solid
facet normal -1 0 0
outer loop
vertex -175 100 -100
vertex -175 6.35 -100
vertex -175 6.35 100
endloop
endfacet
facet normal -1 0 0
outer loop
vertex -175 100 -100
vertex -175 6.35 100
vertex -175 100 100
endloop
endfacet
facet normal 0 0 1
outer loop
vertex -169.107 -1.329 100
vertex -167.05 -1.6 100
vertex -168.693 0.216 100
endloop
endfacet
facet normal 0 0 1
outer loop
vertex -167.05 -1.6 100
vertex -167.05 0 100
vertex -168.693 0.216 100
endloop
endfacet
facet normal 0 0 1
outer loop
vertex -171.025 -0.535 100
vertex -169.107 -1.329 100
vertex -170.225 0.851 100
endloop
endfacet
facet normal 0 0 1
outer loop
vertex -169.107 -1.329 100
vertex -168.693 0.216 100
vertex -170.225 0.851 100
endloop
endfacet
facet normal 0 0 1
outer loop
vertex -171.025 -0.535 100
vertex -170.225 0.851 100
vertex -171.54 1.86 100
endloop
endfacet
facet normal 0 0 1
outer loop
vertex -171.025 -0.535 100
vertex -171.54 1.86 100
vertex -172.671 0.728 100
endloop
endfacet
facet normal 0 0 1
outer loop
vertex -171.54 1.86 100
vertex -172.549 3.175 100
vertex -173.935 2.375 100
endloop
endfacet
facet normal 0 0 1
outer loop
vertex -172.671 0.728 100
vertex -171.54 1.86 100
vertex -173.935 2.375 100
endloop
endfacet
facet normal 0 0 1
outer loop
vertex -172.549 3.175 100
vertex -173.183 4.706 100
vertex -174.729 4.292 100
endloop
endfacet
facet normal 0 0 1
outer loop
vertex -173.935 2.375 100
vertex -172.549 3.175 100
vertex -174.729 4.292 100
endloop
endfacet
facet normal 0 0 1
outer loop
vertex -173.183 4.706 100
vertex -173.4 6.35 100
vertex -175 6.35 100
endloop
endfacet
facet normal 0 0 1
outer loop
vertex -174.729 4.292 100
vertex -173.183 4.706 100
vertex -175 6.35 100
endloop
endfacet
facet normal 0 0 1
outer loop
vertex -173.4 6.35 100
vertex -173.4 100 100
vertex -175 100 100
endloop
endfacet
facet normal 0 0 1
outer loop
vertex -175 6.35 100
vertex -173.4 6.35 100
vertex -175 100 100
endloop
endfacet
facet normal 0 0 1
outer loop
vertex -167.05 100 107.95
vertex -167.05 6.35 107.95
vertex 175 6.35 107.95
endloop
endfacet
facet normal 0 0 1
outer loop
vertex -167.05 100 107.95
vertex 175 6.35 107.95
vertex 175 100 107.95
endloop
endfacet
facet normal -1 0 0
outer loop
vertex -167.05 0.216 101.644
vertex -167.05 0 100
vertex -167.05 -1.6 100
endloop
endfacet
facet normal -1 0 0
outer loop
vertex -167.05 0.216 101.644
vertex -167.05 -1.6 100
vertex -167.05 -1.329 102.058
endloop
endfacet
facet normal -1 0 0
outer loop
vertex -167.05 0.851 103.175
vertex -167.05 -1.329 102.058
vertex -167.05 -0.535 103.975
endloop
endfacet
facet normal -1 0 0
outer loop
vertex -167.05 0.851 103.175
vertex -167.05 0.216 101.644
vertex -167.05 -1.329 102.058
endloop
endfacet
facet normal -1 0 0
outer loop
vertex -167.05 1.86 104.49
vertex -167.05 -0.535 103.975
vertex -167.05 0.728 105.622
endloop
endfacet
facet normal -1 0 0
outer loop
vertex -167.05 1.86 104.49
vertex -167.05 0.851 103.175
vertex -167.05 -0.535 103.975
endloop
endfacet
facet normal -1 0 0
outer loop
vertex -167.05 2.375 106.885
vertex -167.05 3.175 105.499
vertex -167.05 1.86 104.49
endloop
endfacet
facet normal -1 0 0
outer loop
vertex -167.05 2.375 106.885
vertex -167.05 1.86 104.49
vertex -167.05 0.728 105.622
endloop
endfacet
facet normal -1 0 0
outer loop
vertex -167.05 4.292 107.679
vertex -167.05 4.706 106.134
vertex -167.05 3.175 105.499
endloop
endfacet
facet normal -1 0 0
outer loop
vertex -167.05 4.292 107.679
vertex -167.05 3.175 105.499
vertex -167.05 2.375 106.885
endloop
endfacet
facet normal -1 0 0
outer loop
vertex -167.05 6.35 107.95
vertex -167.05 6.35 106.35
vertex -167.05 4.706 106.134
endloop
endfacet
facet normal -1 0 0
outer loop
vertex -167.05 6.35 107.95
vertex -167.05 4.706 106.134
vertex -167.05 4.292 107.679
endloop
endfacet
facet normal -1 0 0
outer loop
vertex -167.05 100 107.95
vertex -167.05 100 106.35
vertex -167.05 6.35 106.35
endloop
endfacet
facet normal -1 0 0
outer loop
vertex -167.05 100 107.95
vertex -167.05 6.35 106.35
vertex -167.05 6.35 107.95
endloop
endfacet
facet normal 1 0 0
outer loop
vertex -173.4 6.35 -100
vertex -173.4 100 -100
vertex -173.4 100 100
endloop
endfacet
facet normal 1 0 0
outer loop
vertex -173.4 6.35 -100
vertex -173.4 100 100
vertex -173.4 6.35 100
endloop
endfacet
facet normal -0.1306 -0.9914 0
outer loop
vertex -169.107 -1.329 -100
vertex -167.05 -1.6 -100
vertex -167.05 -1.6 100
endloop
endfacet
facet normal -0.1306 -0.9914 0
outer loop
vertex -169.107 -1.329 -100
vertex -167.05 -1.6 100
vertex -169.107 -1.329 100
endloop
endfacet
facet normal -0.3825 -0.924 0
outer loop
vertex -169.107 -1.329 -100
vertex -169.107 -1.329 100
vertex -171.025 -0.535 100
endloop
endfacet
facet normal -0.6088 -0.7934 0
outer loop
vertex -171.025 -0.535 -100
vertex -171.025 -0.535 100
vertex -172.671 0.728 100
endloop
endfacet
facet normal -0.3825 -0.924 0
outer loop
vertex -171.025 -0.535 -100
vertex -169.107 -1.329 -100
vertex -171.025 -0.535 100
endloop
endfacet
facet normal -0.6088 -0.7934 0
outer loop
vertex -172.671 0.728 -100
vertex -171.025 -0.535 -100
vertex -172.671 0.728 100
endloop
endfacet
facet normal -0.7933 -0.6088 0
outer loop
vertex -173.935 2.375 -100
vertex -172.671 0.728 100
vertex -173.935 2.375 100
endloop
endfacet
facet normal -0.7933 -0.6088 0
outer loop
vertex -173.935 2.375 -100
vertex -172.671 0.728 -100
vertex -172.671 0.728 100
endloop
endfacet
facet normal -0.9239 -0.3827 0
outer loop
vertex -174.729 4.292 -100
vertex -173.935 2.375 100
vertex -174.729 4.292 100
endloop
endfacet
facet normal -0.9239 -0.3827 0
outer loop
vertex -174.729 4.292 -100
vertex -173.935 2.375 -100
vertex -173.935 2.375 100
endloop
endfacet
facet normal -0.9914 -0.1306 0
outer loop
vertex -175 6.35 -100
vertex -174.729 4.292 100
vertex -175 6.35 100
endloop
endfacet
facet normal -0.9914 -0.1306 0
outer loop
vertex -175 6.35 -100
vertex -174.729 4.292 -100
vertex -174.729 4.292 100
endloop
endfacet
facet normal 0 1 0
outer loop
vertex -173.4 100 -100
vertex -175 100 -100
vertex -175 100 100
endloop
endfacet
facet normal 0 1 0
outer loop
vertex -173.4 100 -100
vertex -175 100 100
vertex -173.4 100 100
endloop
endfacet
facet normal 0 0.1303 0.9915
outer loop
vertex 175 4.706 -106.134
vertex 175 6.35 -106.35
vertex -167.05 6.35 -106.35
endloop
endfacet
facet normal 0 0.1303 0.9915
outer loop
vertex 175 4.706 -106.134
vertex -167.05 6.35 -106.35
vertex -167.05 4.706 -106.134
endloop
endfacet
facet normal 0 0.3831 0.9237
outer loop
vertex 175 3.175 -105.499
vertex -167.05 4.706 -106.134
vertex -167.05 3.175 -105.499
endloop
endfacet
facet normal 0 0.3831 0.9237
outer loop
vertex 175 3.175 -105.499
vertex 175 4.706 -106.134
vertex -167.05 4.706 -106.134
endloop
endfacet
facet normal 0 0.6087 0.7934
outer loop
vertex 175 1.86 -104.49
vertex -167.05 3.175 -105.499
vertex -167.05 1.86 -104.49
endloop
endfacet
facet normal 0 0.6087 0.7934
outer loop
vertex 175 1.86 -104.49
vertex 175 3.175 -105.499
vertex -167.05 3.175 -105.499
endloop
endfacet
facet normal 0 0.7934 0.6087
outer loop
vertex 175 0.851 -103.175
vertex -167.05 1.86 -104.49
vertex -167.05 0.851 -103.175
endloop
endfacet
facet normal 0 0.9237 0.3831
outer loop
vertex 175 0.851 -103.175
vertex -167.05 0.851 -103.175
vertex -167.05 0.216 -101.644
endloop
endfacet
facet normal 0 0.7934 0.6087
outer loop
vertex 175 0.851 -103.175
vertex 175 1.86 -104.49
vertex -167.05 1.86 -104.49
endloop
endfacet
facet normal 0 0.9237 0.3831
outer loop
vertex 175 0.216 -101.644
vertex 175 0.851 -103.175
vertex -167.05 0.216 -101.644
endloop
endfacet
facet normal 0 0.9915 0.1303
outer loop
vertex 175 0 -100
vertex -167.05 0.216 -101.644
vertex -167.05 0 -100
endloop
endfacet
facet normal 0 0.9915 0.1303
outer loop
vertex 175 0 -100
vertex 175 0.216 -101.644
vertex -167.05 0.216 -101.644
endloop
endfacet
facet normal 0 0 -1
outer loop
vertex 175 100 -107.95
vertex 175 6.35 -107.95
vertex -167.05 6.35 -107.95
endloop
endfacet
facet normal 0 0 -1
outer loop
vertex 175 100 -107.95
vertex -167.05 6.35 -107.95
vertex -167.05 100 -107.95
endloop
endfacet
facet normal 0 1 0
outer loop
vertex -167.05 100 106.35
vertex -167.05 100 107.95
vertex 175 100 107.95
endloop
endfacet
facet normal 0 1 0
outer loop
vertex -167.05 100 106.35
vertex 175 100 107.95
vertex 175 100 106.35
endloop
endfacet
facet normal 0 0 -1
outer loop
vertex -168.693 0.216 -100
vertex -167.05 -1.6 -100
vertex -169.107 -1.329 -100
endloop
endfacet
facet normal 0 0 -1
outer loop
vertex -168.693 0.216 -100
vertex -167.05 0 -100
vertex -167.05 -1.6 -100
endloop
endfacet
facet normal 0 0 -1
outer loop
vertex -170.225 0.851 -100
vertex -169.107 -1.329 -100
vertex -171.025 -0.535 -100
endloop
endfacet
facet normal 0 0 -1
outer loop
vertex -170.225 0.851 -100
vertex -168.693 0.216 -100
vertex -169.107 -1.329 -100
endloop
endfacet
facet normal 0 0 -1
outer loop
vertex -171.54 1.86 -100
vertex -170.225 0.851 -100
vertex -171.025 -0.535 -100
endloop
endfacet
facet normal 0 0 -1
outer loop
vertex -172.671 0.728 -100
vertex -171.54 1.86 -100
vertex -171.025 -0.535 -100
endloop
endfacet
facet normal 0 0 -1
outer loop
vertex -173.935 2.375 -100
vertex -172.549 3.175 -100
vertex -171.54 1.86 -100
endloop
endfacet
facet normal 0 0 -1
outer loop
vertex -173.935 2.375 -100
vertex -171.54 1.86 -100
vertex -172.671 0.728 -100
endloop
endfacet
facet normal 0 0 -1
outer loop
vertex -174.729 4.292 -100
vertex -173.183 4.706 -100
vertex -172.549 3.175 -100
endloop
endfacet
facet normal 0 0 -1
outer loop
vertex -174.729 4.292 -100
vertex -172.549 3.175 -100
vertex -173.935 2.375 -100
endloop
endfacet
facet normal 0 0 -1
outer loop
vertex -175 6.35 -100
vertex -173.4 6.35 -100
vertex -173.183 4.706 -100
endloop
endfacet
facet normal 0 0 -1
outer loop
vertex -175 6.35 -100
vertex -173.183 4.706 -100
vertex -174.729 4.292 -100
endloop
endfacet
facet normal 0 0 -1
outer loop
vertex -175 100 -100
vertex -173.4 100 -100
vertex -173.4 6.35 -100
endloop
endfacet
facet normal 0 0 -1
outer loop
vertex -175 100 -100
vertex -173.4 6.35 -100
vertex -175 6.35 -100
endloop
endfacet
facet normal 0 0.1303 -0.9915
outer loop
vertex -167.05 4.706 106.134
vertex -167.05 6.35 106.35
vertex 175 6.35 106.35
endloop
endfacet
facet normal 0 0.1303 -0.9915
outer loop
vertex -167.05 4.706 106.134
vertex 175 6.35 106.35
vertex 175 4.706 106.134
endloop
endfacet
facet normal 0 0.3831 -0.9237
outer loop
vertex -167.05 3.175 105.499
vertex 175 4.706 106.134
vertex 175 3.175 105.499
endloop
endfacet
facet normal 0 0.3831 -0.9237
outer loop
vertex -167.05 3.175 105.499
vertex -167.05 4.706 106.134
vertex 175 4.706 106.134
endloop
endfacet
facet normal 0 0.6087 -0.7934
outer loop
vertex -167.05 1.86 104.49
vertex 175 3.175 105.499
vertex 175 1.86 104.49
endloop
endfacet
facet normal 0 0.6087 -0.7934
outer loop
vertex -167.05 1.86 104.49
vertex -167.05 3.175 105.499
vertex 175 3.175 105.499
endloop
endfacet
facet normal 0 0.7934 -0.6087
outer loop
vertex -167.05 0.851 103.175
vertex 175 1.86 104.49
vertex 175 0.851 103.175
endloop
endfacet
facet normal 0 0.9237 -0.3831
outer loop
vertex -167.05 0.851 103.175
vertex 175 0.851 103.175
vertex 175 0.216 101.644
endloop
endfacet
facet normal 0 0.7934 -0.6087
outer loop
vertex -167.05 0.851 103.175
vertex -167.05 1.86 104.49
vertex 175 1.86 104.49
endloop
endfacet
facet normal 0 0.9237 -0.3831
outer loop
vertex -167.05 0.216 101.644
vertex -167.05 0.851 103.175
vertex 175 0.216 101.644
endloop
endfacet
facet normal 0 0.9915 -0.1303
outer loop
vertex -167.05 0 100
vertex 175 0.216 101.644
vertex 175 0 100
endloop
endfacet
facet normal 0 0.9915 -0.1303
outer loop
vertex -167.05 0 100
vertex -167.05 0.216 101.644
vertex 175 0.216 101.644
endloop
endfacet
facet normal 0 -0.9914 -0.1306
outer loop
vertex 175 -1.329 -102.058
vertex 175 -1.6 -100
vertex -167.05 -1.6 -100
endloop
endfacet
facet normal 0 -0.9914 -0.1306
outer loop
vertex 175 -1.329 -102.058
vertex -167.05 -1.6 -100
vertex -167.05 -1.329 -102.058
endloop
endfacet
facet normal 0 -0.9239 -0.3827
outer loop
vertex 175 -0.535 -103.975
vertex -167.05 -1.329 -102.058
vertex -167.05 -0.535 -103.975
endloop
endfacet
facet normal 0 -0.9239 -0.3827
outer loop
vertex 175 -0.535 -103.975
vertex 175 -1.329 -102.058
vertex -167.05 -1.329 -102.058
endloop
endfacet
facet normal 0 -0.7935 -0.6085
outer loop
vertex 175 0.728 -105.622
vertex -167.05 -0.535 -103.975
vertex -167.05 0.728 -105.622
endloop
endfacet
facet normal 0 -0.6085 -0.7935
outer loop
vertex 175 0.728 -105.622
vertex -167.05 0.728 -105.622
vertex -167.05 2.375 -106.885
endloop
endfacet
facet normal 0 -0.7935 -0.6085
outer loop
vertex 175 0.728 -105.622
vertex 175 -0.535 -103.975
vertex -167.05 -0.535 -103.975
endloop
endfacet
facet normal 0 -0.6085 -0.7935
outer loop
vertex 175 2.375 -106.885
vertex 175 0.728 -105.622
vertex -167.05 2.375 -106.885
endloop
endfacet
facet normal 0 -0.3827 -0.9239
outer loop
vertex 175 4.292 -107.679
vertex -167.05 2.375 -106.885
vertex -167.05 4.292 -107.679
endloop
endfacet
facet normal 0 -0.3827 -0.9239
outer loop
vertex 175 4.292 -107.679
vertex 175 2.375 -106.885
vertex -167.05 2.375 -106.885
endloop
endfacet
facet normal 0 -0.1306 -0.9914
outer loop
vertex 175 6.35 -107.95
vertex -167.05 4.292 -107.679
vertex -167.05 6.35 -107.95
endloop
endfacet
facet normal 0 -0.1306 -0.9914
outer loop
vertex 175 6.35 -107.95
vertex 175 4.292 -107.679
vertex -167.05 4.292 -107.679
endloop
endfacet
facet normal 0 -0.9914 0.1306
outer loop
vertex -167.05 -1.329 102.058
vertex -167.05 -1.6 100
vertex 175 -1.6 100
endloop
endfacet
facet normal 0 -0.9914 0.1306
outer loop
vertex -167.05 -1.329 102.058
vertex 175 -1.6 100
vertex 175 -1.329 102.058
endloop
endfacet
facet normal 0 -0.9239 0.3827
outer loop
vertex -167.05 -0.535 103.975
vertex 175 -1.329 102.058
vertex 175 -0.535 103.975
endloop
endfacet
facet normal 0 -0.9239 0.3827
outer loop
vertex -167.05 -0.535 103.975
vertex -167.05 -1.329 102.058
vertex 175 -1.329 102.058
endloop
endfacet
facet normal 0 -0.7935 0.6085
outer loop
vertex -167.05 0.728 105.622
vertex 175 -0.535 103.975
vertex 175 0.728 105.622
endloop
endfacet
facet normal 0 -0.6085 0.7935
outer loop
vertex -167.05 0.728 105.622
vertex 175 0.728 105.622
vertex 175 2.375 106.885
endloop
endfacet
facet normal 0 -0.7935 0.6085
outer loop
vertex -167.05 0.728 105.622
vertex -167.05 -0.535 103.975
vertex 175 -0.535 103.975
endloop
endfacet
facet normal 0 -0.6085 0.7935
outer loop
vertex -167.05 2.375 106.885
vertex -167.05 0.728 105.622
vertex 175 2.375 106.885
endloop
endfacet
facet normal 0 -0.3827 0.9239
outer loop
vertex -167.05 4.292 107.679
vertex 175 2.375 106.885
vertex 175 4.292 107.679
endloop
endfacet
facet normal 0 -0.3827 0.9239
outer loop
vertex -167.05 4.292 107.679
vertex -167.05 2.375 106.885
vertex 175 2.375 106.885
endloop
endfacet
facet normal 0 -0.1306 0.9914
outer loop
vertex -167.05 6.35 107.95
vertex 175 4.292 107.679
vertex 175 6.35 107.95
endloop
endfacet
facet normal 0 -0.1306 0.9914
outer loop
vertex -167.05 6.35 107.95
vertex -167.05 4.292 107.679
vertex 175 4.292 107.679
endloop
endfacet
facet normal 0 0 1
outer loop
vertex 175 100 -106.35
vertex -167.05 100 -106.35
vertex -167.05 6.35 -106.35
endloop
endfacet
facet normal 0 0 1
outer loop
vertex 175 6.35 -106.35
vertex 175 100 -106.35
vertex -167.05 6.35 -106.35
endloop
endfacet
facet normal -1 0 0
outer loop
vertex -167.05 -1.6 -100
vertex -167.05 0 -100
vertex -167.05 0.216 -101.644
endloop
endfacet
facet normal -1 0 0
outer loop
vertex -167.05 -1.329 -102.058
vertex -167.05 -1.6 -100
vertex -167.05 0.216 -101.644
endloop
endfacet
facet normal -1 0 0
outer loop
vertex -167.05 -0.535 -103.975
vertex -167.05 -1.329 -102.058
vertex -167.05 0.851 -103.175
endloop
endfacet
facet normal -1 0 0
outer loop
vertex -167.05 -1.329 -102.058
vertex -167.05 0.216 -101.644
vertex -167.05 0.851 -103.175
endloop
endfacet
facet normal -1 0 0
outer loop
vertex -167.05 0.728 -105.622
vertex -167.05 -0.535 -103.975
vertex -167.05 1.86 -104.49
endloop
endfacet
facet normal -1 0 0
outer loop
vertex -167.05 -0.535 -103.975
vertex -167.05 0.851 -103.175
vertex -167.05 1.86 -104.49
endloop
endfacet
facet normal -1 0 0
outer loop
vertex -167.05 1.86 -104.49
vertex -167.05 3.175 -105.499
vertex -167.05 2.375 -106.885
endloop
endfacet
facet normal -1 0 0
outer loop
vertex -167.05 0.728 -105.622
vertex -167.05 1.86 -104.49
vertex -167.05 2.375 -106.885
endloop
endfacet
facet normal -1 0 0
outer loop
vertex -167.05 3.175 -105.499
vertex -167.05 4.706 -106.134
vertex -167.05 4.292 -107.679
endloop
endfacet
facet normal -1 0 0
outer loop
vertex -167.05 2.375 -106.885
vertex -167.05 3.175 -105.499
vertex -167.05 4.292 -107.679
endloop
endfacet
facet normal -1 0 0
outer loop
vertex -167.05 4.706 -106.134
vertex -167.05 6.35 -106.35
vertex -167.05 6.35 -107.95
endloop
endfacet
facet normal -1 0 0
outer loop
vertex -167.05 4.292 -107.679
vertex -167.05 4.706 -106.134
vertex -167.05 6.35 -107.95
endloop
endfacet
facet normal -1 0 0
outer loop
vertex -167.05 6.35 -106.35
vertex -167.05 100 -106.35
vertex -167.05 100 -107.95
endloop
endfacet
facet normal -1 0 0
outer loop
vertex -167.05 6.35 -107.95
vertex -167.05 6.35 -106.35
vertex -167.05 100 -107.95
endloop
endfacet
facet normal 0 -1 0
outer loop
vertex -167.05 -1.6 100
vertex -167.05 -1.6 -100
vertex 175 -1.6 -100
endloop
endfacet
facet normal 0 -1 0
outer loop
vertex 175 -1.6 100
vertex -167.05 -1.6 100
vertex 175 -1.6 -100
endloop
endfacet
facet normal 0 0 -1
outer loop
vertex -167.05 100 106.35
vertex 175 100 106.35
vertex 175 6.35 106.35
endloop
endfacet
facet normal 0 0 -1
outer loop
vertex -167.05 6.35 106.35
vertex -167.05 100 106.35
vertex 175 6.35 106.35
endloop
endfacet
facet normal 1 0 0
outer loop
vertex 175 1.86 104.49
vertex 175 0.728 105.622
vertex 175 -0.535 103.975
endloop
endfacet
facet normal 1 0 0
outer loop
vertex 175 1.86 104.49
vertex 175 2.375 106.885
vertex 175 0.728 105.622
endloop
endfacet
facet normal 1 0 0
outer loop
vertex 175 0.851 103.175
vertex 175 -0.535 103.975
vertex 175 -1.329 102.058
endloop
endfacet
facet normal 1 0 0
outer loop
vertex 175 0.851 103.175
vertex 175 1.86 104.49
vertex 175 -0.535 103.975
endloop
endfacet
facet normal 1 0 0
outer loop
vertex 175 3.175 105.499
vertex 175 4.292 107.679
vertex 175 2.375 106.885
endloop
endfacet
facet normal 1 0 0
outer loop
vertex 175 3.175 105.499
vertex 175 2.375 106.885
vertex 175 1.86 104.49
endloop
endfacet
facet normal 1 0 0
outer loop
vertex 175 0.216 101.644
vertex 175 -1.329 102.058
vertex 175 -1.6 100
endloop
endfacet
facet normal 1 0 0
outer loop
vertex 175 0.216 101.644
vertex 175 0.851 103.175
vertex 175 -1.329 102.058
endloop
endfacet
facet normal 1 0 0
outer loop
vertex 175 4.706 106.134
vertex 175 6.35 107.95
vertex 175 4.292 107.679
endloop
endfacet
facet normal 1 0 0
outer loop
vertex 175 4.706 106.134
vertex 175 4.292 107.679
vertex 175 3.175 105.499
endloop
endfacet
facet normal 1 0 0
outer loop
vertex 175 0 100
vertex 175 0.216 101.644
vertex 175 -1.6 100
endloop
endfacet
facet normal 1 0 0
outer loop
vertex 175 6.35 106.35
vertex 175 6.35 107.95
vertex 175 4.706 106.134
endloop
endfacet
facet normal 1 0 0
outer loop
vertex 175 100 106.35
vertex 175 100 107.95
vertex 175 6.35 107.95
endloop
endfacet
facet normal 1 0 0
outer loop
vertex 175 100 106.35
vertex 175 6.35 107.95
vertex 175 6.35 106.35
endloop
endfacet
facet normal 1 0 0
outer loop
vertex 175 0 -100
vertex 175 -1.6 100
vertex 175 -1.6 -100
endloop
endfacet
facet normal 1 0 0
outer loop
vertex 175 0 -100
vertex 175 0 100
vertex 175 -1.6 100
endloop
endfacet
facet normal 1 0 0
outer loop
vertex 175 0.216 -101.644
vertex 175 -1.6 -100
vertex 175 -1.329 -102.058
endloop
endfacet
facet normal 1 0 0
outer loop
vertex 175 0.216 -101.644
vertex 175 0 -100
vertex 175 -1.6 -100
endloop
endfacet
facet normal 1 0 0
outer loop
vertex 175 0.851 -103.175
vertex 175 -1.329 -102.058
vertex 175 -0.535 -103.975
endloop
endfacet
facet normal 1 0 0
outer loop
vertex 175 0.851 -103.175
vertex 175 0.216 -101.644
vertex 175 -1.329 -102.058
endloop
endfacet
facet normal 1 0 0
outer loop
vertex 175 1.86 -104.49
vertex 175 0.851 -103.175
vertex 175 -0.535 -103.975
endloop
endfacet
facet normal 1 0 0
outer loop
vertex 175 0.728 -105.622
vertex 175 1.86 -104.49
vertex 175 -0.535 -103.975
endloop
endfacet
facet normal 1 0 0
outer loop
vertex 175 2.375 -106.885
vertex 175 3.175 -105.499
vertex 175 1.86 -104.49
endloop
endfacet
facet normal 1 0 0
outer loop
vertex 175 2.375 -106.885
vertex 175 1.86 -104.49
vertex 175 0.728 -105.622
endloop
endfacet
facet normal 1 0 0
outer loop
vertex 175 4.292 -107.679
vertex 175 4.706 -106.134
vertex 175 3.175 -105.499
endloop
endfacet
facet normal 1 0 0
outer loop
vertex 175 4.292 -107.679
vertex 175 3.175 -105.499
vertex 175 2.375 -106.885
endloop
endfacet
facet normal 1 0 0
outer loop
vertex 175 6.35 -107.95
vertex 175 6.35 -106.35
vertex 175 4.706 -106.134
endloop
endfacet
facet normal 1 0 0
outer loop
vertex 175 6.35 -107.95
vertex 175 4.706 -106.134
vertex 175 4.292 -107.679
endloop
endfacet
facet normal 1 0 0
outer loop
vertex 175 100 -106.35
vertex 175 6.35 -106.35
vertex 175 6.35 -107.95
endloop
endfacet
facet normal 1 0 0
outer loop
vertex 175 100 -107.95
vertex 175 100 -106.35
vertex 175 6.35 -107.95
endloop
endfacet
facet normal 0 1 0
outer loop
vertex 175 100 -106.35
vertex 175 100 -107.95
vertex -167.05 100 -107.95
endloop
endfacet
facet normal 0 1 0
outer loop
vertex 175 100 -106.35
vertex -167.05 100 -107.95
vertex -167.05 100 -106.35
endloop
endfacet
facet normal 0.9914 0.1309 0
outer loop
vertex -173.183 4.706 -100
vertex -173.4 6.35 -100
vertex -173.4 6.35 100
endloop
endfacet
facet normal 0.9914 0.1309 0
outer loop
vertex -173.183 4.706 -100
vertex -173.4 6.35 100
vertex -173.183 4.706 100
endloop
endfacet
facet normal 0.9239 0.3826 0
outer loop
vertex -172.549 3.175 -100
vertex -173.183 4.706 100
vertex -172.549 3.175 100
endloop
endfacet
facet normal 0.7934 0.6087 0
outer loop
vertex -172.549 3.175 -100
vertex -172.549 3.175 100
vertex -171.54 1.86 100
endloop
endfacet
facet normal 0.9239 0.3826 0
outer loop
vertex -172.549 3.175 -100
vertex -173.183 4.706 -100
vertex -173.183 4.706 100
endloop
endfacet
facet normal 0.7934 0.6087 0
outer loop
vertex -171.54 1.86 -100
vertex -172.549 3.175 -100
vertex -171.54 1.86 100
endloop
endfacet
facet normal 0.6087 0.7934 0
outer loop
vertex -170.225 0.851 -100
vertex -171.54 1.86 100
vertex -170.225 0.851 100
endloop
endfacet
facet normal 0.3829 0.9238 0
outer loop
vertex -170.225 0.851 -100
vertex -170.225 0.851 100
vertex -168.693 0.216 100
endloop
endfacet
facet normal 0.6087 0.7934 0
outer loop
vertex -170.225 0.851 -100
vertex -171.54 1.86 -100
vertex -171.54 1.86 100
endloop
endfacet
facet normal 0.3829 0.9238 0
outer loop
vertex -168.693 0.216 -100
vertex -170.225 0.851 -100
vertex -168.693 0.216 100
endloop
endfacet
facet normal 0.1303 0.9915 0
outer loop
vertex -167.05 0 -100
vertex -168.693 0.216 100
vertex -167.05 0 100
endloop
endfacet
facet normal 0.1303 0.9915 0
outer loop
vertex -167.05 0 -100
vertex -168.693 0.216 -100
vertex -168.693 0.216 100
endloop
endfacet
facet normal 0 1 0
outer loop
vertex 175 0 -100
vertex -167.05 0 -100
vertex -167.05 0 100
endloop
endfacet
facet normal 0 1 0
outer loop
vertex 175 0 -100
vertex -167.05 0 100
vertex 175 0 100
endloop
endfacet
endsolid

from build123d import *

# Parameters (mm, degrees)
SKETCH1_W                    = 350
SKETCH1_H                    = 200
BASE_FLANGE1_DEPTH           = 1.6002
EDGE_FLANGE4_STRIP_W         = 19.1008
EDGE_FLANGE4_STRIP_H         = 1.6002
EDGE_FLANGE4_STRIP_CUT_DEPTH = 200
EDGE_FLANGE4_DEPTH           = 200
EDGE_FLANGE5_DEPTH           = 342.0498
EDGE_FLANGE5_BEND_DEPTH      = 342.0498


# Sheet-metal steps are written as plain solids
with BuildPart() as part:
    # Sketch1 → Base-Flange1 (new body)
    with BuildSketch(Plane(origin=(0, 0, 0), x_dir=(1, 0, 0), z_dir=(0, 1, 0))):
        Rectangle(SKETCH1_W, SKETCH1_H)
    extrude(amount=-BASE_FLANGE1_DEPTH)

    # Edge-Flange4 strip (across the edge) → Edge-Flange4 strip cut (cut)
    with BuildSketch(Plane(origin=(-175, 0, -100), x_dir=(1, 0, 0), z_dir=(0, 0, 1))):
        with Locations((-1.6002, -0.8001)):
            Rectangle(EDGE_FLANGE4_STRIP_W, EDGE_FLANGE4_STRIP_H)
    extrude(amount=EDGE_FLANGE4_STRIP_CUT_DEPTH, mode=Mode.SUBTRACT)

    # Edge-Flange4 section (across the edge) → Edge-Flange4 (add)
    with BuildSketch(Plane(origin=(-175, 0, -100), x_dir=(1, 0, 0), z_dir=(0, 0, 1))):
        with BuildLine():
            Line((0, 6.35), (0, 100))
            Line((0, 100), (1.6002, 100))
            Line((1.6002, 100), (1.6002, 6.35))
            ThreePointArc((1.6002, 6.35), (3.460071939, 1.859871939), (7.9502, 0))
            Line((7.9502, 0), (7.9502, -1.6002))
            ThreePointArc((7.9502, -1.6002), (2.328559668, 0.728359668), (0, 6.35))
        make_face()
    extrude(amount=EDGE_FLANGE4_DEPTH)

    # Edge-Flange5 section (across the edge) → Edge-Flange5 (add)
    with BuildSketch(Plane(origin=(-167.0498, 0, 106.35), x_dir=(0, 0, -1), z_dir=(1, 0, 0))):
        with BuildLine():
            Line((-1.6002, 6.35), (-1.6002, 100))
            Line((-1.6002, 100), (0, 100))
            Line((0, 100), (0, 6.35))
            ThreePointArc((0, 6.35), (1.859871939, 1.859871939), (6.35, 0))
            Line((6.35, 0), (6.35, -1.6002))
            ThreePointArc((6.35, -1.6002), (0.728359668, 0.728359668), (-1.6002, 6.35))
        make_face()
    extrude(amount=EDGE_FLANGE5_DEPTH)

    # Edge-Flange5 section 2 (across the edge) → Edge-Flange5 bend (add)
    with BuildSketch(Plane(origin=(175, 0, -106.35), x_dir=(0, 0, 1), z_dir=(-1, 0, 0))):
        with BuildLine():
            Line((-1.6002, 6.35), (-1.6002, 100))
            Line((-1.6002, 100), (0, 100))
            Line((0, 100), (0, 6.35))
            ThreePointArc((0, 6.35), (1.859871939, 1.859871939), (6.35, 0))
            Line((6.35, 0), (6.35, -1.6002))
            ThreePointArc((6.35, -1.6002), (0.728359668, 0.728359668), (-1.6002, 6.35))
        make_face()
    extrude(amount=EDGE_FLANGE5_BEND_DEPTH)


solid = part.part
